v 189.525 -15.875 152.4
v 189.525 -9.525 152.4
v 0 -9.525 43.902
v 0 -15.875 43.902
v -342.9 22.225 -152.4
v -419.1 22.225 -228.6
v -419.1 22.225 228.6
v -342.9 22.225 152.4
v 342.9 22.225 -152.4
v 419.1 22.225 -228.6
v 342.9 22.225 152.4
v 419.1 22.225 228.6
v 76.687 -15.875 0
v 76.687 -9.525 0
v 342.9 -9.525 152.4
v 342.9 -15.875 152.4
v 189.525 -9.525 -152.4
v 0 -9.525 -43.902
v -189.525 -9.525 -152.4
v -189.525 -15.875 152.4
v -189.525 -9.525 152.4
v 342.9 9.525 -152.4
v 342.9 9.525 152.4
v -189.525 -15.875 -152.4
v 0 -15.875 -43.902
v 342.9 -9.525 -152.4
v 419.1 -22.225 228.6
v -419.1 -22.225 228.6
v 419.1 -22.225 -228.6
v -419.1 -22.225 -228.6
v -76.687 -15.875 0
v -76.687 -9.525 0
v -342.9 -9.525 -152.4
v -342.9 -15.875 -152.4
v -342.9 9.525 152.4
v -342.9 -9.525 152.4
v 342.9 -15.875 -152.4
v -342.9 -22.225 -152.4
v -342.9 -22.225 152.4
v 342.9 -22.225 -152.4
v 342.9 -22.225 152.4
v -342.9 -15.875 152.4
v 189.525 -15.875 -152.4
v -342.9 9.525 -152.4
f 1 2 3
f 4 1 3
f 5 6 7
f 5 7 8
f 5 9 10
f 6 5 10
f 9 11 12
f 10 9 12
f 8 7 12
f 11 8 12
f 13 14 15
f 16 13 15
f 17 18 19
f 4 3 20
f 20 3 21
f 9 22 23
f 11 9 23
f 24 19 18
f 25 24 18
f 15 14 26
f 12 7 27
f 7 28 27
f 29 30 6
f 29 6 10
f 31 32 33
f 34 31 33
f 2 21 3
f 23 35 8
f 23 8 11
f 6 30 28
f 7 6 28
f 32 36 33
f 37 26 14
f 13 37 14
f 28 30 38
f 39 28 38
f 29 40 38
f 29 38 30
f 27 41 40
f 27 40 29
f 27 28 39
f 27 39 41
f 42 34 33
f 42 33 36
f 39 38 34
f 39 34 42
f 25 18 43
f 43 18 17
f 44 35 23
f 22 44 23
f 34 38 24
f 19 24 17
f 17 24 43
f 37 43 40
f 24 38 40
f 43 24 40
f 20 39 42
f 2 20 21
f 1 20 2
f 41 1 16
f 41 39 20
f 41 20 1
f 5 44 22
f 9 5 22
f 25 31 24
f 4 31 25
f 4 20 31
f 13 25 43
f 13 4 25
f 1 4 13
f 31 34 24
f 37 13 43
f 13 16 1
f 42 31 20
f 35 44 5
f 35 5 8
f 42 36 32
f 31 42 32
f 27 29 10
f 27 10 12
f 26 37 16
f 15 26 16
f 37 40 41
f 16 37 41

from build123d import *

# Parameters (mm, degrees)
F0_W     = 838.2
F0_H     = 457.2
F0_W_2   = 685.8
F0_H_2   = 304.8
F1_DEPTH = 22.225
F2_DEPTH = 9.525
F4_DEPTH = 6.35
F6_DEPTH = 6.35


with BuildPart() as f1:
    # F0 (on Front) → F1 (new body, symmetric)
    with BuildSketch(Plane.XZ):
        Rectangle(F0_W, F0_H)
        Rectangle(F0_W_2, F0_H_2, mode=Mode.SUBTRACT)
    extrude(amount=F1_DEPTH, both=True)

    # F0 (on Front) → F2 (join, symmetric)
    with BuildSketch(Plane.XZ):
        Rectangle(F0_W_2, F0_H_2)
    extrude(amount=F2_DEPTH, both=True)

    # F3 (on face) → F4 (join)
    with BuildSketch(Plane.XZ.offset(9.525)):
        Polygon((342.9, -152.4), (-189.5254737066, 152.4), (-342.9, 152.4), (189.5254737066, -152.4), align=None)
    extrude(amount=F4_DEPTH)

    # F5 (on face) → F6 (join)
    with BuildSketch(Plane.XZ.offset(9.525)):
        Polygon((-76.6872631467, 0), (-342.9, -152.4), (-189.5254737066, -152.4), (0, -43.90150164), align=None)
        Polygon((342.9, 152.4), (189.5254737066, 152.4), (0, 43.90150164), (76.6872631467, 0), align=None)
    extrude(amount=F6_DEPTH)


solid = f1.part
